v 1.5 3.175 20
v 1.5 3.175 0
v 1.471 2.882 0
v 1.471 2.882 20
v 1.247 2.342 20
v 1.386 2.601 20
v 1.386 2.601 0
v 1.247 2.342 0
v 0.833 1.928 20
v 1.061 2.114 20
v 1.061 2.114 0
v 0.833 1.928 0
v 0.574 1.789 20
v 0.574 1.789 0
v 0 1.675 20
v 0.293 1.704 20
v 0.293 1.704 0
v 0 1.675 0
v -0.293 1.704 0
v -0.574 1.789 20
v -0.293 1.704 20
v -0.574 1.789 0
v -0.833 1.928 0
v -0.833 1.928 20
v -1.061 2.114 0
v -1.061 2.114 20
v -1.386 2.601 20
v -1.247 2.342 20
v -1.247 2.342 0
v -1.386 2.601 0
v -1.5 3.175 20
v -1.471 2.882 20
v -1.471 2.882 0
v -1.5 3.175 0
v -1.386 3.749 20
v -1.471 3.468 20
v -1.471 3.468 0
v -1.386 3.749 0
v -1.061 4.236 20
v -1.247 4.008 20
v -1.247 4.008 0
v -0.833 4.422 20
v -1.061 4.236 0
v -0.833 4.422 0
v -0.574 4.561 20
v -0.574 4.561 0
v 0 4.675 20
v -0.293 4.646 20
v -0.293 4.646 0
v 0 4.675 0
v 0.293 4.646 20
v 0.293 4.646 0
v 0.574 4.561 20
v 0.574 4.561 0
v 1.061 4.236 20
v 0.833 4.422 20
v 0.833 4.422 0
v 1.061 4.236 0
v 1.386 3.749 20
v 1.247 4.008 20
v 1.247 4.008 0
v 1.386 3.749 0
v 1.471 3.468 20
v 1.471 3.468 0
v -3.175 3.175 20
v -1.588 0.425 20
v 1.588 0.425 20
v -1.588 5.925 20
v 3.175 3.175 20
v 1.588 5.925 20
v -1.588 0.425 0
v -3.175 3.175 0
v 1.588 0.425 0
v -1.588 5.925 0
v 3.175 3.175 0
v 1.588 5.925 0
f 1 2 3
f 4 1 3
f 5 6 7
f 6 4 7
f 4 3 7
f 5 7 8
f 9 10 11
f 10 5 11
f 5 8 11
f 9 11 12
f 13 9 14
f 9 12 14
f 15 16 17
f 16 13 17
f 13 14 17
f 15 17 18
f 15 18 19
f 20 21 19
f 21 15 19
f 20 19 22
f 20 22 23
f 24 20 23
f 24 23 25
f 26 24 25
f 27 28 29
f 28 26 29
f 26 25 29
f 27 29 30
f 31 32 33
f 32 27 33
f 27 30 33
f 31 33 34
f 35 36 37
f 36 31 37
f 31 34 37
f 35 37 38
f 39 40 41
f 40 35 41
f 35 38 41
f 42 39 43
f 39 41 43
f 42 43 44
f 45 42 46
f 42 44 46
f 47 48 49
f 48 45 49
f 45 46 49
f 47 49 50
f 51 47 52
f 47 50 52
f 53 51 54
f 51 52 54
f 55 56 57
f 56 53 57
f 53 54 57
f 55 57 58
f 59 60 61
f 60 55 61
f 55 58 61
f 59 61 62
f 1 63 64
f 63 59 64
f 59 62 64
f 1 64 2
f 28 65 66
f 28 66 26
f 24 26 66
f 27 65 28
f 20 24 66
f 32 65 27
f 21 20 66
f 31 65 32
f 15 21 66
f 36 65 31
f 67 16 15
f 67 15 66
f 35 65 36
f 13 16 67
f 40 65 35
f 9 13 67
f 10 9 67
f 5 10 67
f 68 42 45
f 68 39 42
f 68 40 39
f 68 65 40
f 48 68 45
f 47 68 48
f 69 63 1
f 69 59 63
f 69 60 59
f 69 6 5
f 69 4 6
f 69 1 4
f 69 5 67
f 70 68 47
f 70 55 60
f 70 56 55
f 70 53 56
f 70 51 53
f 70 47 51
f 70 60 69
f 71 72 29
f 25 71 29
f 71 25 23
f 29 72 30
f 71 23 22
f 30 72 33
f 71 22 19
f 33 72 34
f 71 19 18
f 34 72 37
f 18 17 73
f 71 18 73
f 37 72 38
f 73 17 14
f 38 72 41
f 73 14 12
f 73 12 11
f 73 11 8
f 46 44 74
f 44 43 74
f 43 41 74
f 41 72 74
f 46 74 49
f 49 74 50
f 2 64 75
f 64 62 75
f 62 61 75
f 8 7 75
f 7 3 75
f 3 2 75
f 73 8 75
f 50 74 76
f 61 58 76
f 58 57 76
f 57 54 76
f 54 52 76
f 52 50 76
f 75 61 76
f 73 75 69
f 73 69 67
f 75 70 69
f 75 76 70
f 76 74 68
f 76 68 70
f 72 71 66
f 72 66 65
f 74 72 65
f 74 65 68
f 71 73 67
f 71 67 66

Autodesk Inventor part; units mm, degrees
ref_plane "YZ Plane" through (0, 0, 0) normal (1, 0, 0) x (0, 1, 0)
ref_plane "XZ Plane" through (0, 0, 0) normal (0, 1, 0) x (-1, 0, 0)
ref_plane "XY Plane" through (0, 0, 0) normal (0, 0, 1) x (1, 0, 0)
sketch "Sketch1" plane through (0, 0, 0) normal (0, 0, 1) x (1, 0, 0)
  arc A0 (-3.175, 3.175) -> (0, 0) centre (0.0002, 3.1752) ccw construction
  line L0 (44.45, 0) -> (0, 0) construction
  arc A1 (44.45, 0) -> (47.625, 3.175) centre (44.4498, 3.1752) ccw construction
  line L1 (47.625, 79.375) -> (47.625, 3.175) construction
  arc A2 (47.625, 79.375) -> (44.45, 82.55) centre (44.4498, 79.3748) ccw construction
  line L2 (0, 82.55) -> (44.45, 82.55) construction
  arc A3 (0, 82.55) -> (-3.175, 79.375) centre (0.0002, 79.3748) ccw construction
  line L3 (-3.175, 3.175) -> (-3.175, 79.375) construction
  circle A4 centre (0, 3.175) radius 1.6 construction
  circle A5 centre (7.112, 4.191) radius 0.51 construction
  circle A6 centre (7.112, 9.271) radius 0.51 construction
  circle A7 centre (7.112, 6.731) radius 0.51 construction
  circle A8 centre (9.652, 6.731) radius 0.51 construction
  circle A9 centre (9.652, 4.191) radius 0.51 construction
  circle A10 centre (9.652, 9.271) radius 0.51 construction
  circle A11 centre (15.655, 10.499) radius 1.15 construction
  circle A12 centre (14.225, 36.449) radius 0.85 construction
  circle A13 centre (4.699, 60.198) radius 0.51 construction
  circle A14 centre (4.699, 57.658) radius 0.51 construction
  circle A15 centre (0, 79.375) radius 1.6 construction
  circle A16 centre (4.699, 62.738) radius 0.51 construction
  circle A17 centre (4.699, 65.278) radius 0.51 construction
  circle A18 centre (13.7, 69.341) radius 0.46 construction
  circle A19 centre (16.2, 69.341) radius 0.46 construction
  circle A20 centre (6.13, 72.051) radius 1.15 construction
  circle A21 centre (11.7, 69.341) radius 0.46 construction
  circle A22 centre (9.2, 69.341) radius 0.46 construction
  circle A23 centre (23.225, 13.209) radius 0.46 construction
  circle A24 centre (25.725, 13.209) radius 0.46 construction
  circle A25 centre (18.725, 13.209) radius 0.46 construction
  circle A26 centre (21.225, 13.209) radius 0.46 construction
  circle A27 centre (28.795, 10.499) radius 1.15 construction
  circle A28 centre (44.45, 3.175) radius 1.6 construction
  circle A29 centre (30.225, 36.449) radius 0.85 construction
  circle A30 centre (39.751, 57.531) radius 0.51 construction
  circle A31 centre (39.751, 60.071) radius 0.51 construction
  circle A32 centre (31.385, 69.341) radius 0.46 construction
  circle A33 centre (33.385, 69.341) radius 0.46 construction
  circle A34 centre (19.27, 72.051) radius 1.15 construction
  circle A35 centre (28.885, 69.341) radius 0.46 construction
  circle A36 centre (25.815, 72.051) radius 1.15 construction
  circle A37 centre (39.751, 65.151) radius 0.51 construction
  circle A38 centre (39.751, 62.611) radius 0.51 construction
  circle A39 centre (35.885, 69.341) radius 0.46 construction
  circle A40 centre (38.955, 72.051) radius 1.15 construction
  circle A41 centre (44.45, 79.375) radius 1.6 construction
  circle A42 centre (0, 3.175) radius 1.5
  circle A43 centre (0, 3.175) radius 2.75 construction
  line L4 (1.5877, 0.425) -> (-1.5877, 0.425)
  line L5 (-1.5877, 0.425) -> (-3.1754, 3.175)
  line L6 (-3.1754, 3.175) -> (-1.5877, 5.925)
  line L7 (-1.5877, 5.925) -> (1.5877, 5.925)
  line L8 (1.5877, 5.925) -> (3.1754, 3.175)
  line L9 (3.1754, 3.175) -> (1.5877, 0.425)
  dimension "d0" = 3
  dimension "d1" = 5.5
extrude "Extrusion1" add sketch "Sketch1" along normal blind 20
properties part number "Standoff"
